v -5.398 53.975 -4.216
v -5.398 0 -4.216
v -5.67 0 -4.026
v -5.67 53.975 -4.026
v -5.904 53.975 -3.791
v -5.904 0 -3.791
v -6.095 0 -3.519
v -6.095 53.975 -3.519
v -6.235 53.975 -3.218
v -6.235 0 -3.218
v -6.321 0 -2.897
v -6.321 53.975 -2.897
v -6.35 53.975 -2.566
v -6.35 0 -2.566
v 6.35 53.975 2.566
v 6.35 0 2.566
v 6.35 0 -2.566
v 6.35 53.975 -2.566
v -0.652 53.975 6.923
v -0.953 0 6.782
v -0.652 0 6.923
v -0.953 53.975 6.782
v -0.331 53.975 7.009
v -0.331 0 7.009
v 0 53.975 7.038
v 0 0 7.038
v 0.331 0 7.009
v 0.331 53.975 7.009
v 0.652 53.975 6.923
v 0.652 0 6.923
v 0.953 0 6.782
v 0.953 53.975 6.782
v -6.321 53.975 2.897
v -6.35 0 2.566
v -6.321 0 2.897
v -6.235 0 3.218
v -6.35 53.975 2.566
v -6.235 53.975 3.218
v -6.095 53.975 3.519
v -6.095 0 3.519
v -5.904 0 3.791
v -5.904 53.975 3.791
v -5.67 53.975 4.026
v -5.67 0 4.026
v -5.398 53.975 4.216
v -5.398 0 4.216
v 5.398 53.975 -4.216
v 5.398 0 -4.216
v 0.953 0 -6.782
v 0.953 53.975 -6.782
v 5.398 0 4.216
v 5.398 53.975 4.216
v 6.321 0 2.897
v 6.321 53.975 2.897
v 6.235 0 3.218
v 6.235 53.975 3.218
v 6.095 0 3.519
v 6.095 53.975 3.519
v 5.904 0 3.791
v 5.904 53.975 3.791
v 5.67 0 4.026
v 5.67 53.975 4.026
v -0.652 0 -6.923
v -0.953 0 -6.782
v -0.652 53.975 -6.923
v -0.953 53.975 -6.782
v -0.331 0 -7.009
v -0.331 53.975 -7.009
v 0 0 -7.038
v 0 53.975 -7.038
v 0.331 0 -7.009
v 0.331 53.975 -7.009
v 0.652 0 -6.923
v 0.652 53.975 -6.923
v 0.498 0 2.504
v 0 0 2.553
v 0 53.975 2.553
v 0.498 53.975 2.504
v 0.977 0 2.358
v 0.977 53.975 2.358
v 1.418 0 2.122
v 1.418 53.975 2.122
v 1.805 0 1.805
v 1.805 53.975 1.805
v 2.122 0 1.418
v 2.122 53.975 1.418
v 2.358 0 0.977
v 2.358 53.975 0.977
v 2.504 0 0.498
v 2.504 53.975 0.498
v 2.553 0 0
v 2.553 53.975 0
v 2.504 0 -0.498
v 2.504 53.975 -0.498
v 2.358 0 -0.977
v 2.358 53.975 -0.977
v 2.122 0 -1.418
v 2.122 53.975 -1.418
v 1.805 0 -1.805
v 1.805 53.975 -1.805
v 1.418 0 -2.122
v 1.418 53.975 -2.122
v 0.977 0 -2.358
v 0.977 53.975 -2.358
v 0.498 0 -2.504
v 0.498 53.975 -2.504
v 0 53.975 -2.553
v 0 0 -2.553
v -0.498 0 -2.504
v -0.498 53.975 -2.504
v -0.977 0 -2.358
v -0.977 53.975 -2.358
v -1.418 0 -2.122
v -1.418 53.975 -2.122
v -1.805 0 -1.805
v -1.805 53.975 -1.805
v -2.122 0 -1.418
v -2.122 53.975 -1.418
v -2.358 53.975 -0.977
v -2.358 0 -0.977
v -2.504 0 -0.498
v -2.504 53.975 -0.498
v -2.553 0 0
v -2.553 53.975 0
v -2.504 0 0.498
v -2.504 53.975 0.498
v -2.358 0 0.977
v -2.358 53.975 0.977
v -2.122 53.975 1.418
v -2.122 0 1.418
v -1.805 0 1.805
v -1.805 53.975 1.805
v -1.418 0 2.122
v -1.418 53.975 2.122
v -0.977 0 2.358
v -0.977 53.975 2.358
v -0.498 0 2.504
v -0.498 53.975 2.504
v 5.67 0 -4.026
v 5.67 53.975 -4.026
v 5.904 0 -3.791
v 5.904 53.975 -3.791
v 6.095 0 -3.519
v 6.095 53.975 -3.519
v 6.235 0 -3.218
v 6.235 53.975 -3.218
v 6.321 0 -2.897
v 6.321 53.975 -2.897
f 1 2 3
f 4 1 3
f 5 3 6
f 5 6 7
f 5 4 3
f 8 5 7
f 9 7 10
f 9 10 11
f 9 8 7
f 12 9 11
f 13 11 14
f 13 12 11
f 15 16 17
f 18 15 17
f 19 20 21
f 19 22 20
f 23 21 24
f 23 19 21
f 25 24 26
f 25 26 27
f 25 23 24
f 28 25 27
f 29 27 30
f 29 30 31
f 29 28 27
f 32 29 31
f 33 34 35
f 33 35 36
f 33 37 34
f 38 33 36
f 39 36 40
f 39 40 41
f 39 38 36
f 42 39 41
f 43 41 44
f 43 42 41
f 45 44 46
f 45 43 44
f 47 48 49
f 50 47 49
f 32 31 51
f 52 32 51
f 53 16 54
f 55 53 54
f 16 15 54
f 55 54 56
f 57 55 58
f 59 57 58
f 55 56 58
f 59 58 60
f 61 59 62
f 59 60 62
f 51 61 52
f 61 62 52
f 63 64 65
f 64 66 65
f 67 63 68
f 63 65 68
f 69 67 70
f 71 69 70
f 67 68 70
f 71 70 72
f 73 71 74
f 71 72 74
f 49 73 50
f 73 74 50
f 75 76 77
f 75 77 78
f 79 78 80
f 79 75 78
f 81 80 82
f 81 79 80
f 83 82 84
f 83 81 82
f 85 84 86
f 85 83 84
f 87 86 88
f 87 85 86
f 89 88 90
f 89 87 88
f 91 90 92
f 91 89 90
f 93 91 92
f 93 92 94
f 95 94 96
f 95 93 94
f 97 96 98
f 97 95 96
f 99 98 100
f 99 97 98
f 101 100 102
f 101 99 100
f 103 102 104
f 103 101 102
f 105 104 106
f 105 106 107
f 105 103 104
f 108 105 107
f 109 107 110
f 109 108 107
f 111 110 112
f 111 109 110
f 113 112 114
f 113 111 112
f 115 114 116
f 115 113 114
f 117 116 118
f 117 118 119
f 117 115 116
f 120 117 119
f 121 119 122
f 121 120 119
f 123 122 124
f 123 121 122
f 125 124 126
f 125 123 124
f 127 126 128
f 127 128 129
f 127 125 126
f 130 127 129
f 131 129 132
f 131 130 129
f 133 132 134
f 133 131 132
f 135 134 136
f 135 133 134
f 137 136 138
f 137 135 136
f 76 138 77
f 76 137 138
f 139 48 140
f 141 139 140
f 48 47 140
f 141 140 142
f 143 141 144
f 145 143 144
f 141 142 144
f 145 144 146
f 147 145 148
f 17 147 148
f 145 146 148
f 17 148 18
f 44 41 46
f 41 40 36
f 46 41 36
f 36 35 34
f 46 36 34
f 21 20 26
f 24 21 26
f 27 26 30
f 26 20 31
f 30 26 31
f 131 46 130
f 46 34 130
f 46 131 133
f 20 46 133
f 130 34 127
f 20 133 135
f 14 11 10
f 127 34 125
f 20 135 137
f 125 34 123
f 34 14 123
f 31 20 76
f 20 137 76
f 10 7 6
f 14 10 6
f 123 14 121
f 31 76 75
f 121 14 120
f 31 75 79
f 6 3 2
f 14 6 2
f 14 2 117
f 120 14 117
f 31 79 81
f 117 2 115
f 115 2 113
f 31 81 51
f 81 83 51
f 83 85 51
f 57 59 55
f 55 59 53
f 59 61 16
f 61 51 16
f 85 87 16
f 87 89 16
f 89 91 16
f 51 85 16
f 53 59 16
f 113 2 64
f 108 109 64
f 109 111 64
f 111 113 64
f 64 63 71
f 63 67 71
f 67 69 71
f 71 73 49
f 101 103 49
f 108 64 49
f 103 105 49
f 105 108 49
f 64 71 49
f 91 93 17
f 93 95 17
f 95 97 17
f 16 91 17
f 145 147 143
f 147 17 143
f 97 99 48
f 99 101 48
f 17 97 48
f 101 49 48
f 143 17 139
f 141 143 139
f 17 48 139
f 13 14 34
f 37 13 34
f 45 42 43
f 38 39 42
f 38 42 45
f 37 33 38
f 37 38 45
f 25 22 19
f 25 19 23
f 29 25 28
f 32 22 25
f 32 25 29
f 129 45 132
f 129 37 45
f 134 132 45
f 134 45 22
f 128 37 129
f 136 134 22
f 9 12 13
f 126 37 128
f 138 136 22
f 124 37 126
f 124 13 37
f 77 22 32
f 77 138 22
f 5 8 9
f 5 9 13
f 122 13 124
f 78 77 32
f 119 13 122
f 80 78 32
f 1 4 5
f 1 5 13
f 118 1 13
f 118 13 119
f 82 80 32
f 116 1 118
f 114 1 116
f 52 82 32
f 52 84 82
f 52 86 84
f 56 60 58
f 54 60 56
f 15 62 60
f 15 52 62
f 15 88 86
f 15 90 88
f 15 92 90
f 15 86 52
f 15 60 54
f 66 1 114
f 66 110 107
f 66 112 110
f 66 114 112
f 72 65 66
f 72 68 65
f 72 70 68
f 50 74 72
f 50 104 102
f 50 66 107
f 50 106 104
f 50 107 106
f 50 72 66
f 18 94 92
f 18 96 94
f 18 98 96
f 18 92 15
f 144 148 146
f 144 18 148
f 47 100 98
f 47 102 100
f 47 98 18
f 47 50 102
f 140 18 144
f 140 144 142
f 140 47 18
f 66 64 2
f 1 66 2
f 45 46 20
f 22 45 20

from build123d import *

# Parameters (mm, degrees)
SKETCH1_R           = 2.5527
BOSS_EXTRUDE1_DEPTH = 53.975
FILLET1_R           = 1.905


with BuildPart() as part:
    # Sketch1 → Boss-Extrude1 (new body)
    with BuildSketch(Plane(origin=(0, 0, 0), x_dir=(1, 0, 0), z_dir=(0, 1, 0))):
        Polygon((0, 7.332348419), (-6.35, 3.666174209), (-6.35, -3.666174209), (0, -7.332348419), (6.35, -3.666174209), (6.35, 3.666174209), align=None)
        with Locations(Location((0, 0, 0), (0, 0, 270))):
            Circle(SKETCH1_R, mode=Mode.SUBTRACT)
    extrude(amount=BOSS_EXTRUDE1_DEPTH)

    # Fillet1
    fillet1_edges = [part.edges().sort_by_distance(p)[0] for p in [
        (6.35, 26.9875, -3.666174209),
        (6.35, 26.9875, 3.666174209),
        (0, 26.9875, 7.332348419),
        (-6.35, 26.9875, 3.666174209),
        (-6.35, 26.9875, -3.666174209),
        (0, 26.9875, -7.332348419),
    ]]
    fillet(fillet1_edges, radius=FILLET1_R)


solid = part.part
